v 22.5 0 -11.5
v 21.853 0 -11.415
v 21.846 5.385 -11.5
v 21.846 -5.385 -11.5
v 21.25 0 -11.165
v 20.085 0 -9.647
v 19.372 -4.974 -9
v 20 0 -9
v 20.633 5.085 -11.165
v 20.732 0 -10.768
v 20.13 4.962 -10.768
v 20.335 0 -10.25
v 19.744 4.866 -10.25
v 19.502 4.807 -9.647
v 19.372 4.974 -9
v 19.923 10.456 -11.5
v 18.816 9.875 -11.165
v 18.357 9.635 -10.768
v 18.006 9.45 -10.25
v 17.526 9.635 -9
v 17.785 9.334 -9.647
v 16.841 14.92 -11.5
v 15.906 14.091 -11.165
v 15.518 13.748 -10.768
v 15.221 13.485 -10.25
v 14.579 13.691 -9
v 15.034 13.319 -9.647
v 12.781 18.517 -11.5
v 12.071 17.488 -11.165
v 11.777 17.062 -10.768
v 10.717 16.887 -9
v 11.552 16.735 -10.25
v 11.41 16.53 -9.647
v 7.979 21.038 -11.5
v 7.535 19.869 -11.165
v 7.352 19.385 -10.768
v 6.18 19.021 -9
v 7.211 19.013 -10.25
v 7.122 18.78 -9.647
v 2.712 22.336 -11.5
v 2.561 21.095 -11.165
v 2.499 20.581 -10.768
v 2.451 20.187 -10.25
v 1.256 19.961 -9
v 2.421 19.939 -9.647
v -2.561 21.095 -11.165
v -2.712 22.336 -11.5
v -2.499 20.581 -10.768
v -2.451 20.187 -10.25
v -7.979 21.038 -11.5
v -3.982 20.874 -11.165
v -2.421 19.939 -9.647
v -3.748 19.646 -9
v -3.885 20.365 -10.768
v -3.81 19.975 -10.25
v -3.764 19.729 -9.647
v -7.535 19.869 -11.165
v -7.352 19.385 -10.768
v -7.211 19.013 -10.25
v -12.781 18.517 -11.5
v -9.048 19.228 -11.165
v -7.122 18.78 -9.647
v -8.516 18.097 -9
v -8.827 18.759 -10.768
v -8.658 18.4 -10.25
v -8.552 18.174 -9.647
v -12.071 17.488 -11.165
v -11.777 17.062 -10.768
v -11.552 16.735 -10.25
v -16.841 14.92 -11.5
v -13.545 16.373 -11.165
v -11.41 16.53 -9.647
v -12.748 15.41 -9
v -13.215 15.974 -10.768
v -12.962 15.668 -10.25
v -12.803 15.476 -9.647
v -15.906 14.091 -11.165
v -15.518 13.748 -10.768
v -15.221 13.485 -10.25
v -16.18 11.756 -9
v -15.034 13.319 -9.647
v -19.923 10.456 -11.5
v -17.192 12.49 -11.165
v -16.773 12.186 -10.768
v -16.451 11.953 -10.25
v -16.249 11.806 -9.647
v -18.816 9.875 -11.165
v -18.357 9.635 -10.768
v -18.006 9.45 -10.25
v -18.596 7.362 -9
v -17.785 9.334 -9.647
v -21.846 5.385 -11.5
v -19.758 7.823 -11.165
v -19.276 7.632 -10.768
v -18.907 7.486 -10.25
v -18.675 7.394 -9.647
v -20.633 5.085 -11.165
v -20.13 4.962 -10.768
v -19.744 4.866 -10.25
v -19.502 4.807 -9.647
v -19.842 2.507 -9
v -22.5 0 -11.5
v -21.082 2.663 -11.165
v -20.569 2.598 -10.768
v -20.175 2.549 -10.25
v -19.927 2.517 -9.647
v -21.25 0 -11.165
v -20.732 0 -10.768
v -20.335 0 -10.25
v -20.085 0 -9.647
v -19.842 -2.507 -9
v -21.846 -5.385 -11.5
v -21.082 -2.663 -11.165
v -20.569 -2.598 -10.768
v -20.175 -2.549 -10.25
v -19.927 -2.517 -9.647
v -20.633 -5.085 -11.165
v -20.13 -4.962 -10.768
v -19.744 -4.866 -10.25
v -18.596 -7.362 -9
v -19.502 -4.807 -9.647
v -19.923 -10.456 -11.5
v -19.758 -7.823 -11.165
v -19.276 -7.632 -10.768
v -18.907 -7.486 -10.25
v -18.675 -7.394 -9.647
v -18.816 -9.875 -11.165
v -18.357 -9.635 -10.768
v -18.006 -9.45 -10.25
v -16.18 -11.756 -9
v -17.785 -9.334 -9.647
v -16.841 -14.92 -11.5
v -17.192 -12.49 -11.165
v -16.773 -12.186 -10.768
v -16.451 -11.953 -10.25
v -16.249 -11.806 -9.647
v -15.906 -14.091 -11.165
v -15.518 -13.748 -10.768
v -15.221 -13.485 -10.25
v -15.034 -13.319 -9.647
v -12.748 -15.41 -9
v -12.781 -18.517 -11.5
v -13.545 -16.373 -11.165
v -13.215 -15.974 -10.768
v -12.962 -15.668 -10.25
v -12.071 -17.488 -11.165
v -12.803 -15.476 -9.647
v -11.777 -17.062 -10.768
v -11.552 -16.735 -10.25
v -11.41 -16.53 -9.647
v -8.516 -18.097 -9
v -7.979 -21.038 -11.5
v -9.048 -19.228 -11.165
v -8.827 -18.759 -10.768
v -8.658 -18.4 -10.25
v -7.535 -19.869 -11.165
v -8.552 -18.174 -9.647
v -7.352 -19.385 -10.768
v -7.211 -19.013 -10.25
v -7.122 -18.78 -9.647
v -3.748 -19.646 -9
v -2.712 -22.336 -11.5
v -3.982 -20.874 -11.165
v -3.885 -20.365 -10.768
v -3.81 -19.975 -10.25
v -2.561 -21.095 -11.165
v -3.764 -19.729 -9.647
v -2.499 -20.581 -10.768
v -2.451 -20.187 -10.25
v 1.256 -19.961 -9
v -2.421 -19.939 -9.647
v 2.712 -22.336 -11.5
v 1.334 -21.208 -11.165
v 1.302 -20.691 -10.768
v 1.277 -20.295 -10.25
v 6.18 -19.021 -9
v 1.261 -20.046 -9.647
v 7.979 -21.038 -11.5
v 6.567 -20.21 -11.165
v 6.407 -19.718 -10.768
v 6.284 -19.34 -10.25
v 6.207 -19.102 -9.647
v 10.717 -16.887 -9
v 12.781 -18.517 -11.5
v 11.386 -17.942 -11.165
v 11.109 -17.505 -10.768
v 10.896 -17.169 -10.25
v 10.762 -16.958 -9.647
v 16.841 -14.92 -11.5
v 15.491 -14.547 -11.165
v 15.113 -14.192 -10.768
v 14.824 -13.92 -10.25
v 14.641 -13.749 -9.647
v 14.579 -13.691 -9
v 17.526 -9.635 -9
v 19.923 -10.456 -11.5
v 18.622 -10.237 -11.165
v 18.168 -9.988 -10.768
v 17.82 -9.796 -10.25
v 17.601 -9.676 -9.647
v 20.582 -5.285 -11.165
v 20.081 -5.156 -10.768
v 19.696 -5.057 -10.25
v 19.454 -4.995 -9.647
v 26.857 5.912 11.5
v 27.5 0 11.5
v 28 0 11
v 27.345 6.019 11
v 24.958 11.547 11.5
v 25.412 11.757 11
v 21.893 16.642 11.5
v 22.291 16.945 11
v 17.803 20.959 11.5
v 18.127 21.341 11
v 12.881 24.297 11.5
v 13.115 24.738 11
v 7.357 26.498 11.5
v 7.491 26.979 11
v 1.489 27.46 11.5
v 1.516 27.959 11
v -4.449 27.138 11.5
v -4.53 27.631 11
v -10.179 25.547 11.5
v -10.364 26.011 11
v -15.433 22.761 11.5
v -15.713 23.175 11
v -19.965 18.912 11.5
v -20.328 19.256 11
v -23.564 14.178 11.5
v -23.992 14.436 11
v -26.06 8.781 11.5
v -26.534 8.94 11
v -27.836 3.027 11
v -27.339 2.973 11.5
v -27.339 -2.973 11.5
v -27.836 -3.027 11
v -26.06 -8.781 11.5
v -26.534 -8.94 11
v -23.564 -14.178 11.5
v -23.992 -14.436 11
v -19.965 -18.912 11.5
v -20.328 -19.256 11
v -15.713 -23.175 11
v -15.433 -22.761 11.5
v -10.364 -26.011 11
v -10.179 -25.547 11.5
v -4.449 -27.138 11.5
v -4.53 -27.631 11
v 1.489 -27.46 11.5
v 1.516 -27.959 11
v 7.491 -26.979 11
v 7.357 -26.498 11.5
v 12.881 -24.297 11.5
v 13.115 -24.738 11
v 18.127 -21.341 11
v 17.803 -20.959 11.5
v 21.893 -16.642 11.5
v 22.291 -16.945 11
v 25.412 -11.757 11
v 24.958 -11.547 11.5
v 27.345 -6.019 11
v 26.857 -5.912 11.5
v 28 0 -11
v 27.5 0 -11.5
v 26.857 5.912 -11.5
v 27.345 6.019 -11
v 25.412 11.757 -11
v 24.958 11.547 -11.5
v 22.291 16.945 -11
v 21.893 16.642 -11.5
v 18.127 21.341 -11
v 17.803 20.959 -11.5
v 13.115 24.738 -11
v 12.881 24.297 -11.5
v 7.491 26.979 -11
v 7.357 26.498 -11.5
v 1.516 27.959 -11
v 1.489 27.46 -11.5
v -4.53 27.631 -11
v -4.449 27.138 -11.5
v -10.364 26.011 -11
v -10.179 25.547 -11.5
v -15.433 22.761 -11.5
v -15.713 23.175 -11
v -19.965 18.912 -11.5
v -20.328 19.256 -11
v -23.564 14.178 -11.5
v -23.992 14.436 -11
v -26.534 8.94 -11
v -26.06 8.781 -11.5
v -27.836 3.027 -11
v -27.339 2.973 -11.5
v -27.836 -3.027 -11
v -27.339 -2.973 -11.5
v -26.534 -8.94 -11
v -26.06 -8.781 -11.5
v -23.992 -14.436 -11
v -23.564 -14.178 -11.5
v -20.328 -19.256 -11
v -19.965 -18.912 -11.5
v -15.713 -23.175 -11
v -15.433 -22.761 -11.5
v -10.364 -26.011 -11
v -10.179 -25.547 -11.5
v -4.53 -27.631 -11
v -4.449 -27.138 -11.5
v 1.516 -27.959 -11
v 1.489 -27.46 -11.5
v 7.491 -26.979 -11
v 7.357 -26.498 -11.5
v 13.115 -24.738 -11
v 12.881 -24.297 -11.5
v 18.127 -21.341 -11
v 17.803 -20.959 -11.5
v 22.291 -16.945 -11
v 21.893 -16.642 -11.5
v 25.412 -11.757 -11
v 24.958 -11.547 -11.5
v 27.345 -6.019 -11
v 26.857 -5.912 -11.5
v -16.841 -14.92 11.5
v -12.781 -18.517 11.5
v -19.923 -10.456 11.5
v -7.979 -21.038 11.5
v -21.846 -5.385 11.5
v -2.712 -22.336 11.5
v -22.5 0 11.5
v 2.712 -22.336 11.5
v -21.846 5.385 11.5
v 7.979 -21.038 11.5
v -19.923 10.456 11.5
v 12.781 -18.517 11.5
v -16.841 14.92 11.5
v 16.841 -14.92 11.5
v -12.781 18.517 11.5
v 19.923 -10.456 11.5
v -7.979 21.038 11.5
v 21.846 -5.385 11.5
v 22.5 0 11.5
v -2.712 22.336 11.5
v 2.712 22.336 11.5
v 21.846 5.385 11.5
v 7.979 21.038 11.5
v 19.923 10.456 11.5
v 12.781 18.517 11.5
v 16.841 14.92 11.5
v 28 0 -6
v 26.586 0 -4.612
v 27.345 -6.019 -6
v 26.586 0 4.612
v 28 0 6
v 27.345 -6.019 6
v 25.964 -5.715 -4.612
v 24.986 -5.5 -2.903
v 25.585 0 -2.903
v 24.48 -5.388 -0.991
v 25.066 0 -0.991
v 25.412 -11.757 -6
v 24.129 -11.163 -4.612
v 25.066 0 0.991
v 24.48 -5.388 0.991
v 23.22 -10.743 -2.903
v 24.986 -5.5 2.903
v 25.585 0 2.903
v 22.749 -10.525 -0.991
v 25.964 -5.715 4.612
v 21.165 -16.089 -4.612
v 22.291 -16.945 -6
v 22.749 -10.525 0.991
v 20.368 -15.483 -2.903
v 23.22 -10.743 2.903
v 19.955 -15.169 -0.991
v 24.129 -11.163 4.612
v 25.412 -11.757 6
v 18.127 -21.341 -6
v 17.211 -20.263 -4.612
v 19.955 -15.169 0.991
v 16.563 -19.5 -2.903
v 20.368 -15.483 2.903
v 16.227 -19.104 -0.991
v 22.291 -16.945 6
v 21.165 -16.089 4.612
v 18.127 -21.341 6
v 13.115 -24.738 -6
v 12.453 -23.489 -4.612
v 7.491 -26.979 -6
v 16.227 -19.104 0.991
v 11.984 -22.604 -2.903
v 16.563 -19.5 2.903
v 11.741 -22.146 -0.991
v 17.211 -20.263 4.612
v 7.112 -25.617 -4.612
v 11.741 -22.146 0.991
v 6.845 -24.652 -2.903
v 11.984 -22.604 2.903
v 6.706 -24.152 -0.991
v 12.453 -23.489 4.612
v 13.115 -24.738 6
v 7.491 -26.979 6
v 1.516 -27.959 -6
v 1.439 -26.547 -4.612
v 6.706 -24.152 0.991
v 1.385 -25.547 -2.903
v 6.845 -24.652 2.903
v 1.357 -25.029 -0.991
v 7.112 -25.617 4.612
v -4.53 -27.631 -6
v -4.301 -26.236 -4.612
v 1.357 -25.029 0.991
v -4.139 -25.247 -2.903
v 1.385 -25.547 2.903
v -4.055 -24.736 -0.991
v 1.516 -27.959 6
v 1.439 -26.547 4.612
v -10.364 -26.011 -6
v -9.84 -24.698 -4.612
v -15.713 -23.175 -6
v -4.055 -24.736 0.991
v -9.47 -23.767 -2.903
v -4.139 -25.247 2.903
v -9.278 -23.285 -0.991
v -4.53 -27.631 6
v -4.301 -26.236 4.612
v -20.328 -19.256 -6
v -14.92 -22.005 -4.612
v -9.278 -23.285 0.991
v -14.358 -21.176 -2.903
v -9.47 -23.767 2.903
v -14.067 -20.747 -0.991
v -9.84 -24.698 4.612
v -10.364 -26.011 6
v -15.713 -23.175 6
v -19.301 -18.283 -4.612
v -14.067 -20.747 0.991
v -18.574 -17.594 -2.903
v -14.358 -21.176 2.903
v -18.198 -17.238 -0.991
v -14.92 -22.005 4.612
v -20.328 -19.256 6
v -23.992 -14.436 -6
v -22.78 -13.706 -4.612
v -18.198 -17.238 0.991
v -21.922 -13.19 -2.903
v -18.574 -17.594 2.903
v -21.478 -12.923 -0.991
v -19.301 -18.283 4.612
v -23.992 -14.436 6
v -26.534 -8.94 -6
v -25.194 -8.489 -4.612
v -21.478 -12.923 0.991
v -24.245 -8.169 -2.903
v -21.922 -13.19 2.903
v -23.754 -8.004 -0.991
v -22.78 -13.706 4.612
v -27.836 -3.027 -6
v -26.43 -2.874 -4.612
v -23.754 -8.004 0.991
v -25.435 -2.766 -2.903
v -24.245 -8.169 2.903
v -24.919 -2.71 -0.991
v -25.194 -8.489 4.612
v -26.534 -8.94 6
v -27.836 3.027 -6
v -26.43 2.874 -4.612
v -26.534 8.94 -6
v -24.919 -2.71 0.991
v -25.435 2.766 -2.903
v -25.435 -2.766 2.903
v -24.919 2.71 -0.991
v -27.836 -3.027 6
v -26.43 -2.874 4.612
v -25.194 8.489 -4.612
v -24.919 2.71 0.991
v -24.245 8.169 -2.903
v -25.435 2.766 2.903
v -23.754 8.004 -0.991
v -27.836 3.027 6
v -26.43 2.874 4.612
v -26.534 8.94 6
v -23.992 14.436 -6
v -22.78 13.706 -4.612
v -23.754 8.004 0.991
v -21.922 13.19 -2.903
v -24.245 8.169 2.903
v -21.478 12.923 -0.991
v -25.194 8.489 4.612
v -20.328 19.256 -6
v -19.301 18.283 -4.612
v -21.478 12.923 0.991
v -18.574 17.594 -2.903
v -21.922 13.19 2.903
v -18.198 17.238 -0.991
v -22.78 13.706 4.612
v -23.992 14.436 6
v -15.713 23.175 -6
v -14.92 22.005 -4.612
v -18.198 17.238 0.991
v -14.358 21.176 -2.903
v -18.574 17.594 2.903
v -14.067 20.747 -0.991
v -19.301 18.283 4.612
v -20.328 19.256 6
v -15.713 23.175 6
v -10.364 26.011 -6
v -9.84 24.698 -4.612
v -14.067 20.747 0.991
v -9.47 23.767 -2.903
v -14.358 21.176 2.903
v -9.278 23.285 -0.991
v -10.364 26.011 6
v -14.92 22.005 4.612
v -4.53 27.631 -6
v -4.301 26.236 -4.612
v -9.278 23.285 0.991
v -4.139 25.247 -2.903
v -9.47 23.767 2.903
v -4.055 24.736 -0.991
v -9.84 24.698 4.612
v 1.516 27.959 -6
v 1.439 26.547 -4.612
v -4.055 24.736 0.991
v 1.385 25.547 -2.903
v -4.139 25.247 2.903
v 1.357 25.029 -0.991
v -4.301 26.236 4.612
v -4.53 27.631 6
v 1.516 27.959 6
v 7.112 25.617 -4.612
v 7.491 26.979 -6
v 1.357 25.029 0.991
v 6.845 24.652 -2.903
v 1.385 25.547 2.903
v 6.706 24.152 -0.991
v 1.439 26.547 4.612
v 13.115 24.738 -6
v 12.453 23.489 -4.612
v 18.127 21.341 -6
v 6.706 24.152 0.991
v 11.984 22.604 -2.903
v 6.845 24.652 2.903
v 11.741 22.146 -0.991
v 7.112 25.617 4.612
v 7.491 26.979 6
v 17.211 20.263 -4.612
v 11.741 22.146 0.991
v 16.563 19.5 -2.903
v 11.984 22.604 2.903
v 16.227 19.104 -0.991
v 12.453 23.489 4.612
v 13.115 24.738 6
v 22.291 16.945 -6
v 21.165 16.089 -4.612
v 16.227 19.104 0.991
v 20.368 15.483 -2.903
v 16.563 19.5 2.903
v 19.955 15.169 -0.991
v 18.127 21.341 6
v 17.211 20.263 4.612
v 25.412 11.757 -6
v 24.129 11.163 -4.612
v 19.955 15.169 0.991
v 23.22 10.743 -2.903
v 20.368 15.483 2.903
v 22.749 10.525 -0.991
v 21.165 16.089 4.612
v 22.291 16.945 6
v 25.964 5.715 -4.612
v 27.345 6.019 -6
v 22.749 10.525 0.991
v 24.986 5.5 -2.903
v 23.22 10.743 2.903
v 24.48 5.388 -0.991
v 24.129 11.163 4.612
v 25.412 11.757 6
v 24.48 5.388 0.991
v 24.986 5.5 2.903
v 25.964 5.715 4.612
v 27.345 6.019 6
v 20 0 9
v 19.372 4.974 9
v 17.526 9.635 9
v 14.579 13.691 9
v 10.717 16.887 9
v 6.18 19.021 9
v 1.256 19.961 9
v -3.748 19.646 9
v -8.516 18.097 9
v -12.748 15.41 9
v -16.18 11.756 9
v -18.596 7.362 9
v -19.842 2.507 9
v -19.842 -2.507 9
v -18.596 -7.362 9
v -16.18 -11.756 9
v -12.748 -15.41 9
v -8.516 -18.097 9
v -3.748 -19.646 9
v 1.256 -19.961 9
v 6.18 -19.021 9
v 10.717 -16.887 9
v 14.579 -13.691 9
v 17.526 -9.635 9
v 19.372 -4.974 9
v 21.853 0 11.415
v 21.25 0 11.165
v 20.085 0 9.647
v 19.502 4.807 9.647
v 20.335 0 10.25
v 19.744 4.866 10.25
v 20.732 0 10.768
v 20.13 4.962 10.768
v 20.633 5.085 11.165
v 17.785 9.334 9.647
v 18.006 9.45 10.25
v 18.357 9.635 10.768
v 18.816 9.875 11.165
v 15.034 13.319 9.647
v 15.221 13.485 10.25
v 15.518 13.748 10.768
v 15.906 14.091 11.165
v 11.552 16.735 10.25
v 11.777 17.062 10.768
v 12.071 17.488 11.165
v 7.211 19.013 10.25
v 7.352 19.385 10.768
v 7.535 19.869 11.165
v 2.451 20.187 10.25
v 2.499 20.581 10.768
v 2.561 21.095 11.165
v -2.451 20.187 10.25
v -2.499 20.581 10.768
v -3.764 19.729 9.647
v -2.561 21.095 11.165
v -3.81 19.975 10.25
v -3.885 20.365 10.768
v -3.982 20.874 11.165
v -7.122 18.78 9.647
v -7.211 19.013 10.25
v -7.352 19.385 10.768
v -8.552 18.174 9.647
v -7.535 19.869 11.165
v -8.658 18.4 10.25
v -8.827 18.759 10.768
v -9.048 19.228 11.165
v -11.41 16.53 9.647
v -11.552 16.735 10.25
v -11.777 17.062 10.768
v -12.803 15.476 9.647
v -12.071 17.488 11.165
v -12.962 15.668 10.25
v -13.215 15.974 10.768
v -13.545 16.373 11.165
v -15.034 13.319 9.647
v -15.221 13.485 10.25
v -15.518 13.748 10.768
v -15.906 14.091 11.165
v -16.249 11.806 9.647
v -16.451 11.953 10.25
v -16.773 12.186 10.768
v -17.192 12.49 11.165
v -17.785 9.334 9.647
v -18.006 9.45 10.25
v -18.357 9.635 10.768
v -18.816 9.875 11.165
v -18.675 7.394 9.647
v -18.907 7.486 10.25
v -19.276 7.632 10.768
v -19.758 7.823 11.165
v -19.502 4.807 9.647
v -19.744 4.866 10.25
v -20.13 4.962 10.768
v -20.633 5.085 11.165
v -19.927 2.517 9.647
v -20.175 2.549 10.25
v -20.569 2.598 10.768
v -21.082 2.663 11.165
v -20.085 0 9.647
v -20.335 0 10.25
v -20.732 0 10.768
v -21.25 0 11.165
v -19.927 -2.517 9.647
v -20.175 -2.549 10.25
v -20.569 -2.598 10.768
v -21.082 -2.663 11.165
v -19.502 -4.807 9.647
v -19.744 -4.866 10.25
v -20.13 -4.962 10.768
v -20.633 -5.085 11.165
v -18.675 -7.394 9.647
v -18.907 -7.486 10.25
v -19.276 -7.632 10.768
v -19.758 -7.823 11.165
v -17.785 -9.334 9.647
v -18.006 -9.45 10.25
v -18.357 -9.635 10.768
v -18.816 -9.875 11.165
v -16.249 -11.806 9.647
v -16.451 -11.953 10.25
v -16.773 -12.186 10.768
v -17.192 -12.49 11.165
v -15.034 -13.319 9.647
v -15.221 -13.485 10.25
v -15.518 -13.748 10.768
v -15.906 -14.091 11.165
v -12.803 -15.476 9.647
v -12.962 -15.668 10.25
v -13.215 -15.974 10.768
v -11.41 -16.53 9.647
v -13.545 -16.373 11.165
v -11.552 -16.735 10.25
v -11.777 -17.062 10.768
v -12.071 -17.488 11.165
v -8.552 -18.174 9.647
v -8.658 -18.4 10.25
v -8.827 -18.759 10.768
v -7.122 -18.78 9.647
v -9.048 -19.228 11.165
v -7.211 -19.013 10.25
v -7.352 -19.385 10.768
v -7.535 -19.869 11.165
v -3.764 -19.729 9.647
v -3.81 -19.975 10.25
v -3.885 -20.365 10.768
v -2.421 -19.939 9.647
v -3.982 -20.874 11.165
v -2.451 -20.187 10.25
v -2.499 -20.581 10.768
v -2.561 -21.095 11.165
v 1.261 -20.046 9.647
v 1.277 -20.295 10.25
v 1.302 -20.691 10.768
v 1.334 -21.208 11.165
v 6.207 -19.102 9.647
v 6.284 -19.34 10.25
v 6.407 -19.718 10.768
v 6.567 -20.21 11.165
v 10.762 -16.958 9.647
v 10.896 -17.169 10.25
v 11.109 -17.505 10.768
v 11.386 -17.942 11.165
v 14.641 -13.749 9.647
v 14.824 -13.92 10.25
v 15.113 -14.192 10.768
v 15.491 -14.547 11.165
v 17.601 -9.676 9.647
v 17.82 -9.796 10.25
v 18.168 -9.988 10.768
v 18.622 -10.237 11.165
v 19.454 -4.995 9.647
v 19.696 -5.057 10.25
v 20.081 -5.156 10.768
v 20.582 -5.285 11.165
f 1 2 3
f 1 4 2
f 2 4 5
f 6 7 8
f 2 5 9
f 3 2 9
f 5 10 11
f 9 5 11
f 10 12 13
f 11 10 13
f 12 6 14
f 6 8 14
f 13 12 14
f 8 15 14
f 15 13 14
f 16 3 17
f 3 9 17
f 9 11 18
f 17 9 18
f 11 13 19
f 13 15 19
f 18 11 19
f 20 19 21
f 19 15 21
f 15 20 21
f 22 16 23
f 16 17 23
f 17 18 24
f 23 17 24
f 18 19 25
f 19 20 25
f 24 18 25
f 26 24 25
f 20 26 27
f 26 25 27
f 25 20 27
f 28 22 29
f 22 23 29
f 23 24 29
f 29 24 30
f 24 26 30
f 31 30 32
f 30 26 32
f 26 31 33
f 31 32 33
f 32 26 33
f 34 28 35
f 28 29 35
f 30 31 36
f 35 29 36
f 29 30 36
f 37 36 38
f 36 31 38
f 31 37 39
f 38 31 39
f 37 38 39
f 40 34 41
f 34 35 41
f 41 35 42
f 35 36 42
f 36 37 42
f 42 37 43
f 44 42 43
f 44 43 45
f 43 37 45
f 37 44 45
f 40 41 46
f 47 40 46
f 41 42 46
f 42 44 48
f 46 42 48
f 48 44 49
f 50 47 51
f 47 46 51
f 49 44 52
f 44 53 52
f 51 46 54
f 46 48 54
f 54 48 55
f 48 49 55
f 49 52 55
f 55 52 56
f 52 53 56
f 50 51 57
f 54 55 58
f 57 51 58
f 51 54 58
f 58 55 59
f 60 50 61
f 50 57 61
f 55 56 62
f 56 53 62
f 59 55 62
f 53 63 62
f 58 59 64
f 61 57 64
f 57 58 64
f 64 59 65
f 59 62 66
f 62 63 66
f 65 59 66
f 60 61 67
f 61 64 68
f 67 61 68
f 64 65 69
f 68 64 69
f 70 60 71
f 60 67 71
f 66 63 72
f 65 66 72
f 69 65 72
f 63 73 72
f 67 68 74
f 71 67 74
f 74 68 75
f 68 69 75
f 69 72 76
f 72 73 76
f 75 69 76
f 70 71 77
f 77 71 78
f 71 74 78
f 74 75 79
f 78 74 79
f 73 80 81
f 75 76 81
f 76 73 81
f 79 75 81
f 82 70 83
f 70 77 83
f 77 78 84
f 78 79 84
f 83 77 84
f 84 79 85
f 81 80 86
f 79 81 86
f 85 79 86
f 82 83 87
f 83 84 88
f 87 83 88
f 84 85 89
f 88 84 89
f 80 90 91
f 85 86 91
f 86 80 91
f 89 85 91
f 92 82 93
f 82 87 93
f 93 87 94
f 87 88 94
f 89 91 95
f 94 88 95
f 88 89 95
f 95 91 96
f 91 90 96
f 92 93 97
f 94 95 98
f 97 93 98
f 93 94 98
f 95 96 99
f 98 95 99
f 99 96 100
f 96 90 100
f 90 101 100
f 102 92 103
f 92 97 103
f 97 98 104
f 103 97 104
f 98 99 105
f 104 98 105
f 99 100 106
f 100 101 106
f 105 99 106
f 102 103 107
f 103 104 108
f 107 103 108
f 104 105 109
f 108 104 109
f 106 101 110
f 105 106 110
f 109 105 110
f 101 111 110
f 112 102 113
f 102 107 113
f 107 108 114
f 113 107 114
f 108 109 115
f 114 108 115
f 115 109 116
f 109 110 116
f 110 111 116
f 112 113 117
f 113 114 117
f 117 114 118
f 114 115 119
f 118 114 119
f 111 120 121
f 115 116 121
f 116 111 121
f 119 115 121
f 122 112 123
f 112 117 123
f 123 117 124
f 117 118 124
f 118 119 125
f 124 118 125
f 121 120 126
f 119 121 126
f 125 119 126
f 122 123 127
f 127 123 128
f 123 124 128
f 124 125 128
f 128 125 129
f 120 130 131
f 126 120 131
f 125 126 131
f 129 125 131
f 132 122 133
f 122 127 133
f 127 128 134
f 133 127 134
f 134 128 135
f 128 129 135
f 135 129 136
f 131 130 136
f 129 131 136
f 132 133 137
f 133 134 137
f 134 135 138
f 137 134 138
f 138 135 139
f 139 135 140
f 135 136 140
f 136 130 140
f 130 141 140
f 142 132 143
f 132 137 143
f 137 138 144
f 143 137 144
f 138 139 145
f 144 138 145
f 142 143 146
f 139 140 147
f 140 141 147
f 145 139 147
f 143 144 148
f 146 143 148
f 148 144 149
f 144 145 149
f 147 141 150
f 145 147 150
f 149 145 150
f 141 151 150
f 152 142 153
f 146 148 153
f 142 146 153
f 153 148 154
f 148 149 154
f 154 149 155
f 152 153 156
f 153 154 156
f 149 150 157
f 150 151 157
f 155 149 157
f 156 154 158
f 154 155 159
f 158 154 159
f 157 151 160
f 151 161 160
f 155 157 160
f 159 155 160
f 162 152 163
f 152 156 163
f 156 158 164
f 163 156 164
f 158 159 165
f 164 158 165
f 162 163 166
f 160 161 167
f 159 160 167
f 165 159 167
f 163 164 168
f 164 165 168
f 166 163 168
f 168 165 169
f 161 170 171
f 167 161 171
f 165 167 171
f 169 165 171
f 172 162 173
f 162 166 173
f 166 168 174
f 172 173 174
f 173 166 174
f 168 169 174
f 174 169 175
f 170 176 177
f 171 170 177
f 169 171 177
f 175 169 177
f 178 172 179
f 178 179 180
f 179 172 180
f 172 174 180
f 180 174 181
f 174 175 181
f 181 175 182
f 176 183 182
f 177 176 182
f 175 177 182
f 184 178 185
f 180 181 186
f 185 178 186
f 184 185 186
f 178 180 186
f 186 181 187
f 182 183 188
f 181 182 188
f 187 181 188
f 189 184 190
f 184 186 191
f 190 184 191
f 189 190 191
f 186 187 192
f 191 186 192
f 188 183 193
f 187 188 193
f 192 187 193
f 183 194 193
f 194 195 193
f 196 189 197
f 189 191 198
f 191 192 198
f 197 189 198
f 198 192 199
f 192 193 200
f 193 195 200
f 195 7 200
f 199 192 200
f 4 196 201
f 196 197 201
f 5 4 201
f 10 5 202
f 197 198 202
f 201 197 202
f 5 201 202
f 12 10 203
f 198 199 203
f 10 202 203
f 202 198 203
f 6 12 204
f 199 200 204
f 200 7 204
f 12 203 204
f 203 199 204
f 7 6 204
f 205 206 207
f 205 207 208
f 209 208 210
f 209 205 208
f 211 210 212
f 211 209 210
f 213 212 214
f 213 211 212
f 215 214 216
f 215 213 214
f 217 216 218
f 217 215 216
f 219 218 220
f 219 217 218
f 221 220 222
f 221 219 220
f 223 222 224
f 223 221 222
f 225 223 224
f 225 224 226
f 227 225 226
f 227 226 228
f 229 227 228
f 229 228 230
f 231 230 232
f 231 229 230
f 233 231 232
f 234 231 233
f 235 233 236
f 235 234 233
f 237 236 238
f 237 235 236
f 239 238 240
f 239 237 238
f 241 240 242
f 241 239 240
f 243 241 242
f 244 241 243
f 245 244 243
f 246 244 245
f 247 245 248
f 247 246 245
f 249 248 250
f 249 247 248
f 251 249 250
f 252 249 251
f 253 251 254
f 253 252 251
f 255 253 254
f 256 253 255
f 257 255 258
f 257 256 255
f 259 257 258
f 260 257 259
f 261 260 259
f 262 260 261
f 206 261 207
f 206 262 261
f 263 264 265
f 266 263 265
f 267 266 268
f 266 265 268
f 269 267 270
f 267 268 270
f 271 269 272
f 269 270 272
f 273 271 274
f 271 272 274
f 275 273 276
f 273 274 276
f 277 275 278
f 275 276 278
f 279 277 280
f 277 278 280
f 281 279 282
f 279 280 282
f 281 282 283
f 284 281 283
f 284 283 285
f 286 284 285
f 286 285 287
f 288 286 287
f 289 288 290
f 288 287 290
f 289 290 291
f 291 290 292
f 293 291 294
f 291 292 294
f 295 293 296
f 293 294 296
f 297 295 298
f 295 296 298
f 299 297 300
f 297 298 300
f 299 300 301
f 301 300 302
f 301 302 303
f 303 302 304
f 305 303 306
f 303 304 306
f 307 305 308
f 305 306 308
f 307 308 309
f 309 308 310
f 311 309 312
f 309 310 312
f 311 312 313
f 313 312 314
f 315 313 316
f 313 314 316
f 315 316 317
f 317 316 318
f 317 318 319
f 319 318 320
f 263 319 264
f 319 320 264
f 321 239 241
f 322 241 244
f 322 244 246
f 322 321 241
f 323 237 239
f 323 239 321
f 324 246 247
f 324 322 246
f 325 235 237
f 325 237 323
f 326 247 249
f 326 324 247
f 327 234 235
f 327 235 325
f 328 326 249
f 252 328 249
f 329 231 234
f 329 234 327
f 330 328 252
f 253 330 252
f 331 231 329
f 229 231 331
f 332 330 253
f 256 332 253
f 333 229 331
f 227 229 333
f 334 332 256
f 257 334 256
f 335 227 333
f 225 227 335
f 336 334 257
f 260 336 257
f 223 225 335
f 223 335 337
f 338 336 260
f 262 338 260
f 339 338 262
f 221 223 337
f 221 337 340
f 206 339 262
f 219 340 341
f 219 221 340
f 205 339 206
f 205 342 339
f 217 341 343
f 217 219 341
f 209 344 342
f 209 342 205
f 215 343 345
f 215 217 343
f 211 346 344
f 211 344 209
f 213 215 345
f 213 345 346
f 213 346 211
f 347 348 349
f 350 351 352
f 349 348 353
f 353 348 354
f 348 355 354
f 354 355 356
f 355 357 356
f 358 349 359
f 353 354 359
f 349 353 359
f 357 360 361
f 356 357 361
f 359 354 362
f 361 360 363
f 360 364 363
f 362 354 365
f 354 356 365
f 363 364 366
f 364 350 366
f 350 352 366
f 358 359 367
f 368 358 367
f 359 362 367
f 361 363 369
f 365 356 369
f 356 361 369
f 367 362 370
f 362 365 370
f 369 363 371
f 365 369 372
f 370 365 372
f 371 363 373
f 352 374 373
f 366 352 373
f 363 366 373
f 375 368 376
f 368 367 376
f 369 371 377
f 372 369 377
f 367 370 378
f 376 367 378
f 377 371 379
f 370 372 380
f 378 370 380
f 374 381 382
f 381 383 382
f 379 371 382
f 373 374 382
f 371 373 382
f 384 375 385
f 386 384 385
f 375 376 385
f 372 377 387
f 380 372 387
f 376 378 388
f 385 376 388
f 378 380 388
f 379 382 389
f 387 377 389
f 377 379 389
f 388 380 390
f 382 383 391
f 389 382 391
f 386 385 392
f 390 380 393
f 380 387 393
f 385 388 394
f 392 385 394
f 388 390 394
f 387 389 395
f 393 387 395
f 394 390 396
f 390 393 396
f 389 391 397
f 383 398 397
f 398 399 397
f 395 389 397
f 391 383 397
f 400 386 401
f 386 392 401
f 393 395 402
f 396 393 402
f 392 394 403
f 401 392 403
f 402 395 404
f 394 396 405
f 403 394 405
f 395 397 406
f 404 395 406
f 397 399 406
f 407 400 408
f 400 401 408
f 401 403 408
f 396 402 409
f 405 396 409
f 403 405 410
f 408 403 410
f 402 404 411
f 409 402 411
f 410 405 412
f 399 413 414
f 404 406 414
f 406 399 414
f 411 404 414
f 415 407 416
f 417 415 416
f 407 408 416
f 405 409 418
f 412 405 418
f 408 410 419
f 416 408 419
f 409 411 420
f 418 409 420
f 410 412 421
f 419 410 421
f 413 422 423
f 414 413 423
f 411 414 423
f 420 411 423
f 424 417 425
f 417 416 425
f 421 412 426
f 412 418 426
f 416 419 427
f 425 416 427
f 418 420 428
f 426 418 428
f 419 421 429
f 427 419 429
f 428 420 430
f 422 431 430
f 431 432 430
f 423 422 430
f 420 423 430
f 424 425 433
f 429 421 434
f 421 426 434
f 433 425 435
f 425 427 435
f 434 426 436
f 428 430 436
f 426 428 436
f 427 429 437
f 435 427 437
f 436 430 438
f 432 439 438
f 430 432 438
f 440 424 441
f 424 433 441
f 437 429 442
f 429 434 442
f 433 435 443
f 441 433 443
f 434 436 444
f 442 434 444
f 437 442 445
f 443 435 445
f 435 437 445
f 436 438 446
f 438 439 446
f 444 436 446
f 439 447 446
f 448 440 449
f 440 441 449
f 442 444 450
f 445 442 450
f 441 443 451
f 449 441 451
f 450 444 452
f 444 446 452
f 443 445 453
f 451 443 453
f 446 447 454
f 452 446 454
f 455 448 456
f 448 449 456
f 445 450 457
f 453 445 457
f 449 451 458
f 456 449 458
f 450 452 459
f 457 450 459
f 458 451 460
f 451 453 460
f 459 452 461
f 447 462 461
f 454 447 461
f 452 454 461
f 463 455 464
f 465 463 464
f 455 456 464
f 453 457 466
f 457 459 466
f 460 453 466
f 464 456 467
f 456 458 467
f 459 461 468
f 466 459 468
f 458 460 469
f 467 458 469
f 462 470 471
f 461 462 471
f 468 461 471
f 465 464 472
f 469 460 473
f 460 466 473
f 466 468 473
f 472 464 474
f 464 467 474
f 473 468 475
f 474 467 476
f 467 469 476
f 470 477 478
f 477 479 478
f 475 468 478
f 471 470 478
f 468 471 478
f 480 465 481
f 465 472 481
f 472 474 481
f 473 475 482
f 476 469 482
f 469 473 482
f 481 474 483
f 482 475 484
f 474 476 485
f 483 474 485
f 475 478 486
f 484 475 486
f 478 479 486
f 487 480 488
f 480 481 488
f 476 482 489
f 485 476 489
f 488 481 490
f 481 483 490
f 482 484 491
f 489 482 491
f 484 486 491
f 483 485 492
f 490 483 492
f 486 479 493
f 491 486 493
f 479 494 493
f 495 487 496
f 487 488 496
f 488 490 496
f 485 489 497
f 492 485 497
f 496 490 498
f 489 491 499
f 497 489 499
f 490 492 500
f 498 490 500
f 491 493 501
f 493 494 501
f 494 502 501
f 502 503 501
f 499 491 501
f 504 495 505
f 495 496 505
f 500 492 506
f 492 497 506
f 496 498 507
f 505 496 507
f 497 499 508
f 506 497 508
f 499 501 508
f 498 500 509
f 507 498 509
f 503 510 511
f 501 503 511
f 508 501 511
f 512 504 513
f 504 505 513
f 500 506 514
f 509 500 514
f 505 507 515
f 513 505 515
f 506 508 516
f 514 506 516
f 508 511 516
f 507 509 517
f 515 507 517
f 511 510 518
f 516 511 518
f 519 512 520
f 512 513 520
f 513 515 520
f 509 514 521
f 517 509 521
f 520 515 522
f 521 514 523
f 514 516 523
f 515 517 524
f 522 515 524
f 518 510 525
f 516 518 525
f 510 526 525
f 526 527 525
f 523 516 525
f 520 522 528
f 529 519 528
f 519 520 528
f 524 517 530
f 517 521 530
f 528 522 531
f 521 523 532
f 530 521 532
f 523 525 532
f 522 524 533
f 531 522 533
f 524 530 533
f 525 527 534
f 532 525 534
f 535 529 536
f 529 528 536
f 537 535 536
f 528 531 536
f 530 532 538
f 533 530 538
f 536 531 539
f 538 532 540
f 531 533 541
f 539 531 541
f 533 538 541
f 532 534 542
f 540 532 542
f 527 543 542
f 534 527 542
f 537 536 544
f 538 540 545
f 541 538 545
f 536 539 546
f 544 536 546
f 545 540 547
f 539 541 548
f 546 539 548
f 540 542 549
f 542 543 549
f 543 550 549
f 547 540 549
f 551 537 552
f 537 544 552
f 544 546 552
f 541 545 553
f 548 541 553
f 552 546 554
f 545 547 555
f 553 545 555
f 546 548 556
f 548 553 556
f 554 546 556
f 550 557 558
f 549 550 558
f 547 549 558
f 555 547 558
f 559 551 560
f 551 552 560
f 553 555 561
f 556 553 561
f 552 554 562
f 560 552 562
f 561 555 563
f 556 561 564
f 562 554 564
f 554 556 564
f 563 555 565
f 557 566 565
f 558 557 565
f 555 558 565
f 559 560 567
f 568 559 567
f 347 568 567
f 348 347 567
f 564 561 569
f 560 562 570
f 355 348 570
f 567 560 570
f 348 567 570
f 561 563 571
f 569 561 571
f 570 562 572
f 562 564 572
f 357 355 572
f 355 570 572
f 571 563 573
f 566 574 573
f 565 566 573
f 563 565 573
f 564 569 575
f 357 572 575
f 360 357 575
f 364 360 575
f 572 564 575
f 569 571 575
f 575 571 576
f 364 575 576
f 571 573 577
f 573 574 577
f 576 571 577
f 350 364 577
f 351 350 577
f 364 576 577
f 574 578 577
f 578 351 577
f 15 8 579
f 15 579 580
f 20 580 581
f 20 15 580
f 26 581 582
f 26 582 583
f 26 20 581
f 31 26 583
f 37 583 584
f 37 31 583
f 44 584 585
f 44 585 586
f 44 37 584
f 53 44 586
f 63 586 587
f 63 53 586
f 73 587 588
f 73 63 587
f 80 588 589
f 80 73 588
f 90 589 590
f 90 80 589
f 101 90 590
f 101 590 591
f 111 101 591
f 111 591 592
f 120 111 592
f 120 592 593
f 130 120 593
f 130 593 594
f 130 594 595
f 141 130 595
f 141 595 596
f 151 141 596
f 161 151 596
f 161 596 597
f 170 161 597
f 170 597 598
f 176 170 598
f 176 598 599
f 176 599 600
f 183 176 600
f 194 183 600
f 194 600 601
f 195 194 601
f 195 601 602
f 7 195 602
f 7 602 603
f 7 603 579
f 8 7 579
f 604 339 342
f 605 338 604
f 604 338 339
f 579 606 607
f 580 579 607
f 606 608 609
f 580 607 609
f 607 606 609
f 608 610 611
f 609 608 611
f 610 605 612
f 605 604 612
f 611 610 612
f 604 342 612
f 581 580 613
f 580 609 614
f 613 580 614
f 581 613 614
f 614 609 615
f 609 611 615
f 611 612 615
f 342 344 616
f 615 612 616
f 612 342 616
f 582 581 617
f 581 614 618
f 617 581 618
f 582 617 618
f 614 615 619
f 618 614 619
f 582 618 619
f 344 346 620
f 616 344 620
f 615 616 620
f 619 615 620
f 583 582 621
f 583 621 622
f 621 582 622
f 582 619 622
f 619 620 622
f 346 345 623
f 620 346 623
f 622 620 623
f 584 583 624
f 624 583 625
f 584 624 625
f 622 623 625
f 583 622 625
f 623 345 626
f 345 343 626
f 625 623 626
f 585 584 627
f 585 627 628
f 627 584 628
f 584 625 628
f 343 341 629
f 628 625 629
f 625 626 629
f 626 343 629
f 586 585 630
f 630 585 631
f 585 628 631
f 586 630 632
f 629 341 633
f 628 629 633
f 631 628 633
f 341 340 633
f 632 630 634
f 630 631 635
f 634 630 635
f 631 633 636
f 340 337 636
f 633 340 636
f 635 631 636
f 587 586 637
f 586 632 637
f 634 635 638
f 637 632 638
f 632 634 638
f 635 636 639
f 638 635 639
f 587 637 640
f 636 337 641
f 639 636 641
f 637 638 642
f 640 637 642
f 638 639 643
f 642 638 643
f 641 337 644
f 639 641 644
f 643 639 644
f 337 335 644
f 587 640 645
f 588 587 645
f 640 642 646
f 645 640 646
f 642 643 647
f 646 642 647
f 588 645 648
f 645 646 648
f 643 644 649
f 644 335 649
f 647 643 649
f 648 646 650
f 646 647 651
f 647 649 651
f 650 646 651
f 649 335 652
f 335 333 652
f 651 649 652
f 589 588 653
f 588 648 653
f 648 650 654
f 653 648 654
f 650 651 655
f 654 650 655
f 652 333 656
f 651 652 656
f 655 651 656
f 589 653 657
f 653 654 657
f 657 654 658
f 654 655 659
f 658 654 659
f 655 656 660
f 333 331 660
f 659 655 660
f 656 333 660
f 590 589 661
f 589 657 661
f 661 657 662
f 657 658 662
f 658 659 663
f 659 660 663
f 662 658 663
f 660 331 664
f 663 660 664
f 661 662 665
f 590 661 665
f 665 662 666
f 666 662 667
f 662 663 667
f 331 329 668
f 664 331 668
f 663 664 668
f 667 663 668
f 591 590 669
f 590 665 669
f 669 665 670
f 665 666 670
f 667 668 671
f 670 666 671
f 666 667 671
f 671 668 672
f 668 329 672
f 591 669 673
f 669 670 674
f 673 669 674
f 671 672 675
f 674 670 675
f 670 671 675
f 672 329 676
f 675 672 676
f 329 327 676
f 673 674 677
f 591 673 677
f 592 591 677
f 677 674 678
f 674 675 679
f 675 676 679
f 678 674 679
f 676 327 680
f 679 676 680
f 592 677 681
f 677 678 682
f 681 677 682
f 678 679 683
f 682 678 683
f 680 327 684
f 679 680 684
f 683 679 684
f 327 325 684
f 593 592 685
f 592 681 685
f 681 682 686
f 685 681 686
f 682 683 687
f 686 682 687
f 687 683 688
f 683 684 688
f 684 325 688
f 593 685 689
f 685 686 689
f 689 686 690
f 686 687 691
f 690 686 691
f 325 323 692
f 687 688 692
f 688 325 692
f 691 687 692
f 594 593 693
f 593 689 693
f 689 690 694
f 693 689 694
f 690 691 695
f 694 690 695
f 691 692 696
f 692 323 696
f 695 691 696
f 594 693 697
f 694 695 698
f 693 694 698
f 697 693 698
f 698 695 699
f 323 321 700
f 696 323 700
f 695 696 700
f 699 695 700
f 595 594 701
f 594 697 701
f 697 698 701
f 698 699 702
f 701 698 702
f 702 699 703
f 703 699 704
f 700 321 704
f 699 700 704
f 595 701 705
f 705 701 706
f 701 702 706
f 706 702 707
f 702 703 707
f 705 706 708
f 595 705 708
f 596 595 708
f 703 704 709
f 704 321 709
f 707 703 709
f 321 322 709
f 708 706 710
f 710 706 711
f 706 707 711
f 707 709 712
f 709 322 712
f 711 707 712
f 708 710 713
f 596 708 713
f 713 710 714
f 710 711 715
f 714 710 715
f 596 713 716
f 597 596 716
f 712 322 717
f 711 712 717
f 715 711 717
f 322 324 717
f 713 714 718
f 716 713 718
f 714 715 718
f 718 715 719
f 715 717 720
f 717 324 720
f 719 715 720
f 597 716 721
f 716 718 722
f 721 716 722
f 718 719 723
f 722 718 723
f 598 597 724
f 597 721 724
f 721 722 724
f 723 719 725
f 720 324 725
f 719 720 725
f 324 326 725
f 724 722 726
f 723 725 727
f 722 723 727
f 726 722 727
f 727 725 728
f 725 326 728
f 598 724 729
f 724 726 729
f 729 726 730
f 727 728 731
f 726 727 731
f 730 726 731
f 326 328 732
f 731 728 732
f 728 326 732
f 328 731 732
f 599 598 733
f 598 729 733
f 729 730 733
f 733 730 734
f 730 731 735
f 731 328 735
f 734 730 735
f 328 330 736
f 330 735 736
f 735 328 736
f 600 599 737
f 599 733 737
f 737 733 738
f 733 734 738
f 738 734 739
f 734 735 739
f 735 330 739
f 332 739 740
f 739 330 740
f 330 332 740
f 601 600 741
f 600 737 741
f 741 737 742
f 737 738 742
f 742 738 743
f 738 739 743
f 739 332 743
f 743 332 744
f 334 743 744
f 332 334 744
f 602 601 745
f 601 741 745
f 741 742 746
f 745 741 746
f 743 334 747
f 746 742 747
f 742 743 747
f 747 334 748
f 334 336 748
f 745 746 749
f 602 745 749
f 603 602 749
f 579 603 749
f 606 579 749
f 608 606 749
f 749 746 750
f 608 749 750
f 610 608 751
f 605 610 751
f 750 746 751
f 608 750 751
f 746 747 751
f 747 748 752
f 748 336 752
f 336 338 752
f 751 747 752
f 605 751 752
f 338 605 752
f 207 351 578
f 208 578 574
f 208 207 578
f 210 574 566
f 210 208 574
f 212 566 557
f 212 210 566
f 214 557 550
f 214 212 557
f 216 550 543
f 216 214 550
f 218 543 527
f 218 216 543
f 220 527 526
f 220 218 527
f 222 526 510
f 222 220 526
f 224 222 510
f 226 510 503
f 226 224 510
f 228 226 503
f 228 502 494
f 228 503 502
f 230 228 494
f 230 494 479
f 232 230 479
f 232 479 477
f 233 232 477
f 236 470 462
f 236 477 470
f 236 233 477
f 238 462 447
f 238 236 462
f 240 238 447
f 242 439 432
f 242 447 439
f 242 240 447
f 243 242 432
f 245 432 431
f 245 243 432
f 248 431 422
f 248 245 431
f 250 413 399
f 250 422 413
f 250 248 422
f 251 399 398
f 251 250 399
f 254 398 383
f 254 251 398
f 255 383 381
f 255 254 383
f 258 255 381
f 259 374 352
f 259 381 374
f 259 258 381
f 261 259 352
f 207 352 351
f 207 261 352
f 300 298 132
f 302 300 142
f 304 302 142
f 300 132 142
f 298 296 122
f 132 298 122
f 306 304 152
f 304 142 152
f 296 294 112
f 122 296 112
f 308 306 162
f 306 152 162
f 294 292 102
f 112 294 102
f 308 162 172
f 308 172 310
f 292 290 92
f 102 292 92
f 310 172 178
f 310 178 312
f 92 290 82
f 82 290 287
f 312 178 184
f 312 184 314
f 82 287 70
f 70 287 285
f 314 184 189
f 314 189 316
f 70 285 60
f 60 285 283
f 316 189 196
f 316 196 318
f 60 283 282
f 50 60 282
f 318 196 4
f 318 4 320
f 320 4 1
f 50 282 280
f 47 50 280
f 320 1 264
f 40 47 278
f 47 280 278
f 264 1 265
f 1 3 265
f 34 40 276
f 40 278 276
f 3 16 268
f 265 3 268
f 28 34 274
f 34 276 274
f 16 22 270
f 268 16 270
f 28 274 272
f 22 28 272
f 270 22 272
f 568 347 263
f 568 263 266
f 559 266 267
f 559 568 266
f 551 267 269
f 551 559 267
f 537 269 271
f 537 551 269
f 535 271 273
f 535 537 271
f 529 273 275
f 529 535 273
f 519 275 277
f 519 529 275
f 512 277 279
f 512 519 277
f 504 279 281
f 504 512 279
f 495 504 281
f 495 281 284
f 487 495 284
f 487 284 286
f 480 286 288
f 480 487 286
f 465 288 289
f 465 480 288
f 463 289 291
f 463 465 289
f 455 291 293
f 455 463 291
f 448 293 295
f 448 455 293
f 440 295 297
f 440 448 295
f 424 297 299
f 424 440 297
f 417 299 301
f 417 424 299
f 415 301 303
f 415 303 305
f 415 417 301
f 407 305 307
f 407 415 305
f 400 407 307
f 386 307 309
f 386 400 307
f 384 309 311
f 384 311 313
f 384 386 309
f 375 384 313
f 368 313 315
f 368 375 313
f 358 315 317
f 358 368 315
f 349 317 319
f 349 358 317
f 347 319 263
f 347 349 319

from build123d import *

# Parameters (mm, degrees)
SKETCH1_R           = 28
SKETCH1_R_2         = 20
BOSS_EXTRUDE1_DEPTH = 11.5
SKETCH3_R           = 7.5
CHAMFER1_SIZE       = 0.5
FILLET1_R           = 2.5


with BuildPart() as part:
    # Sketch1 → Boss-Extrude1 (new, symmetric)
    with BuildSketch(Plane.XY):
        Circle(SKETCH1_R)
        Circle(SKETCH1_R_2, mode=Mode.SUBTRACT)
    extrude(amount=BOSS_EXTRUDE1_DEPTH, both=True)

    # Sketch3 → Cut-Revolve1 (revolve, cut)
    with BuildSketch(Plane(origin=(0, 0, 0), x_dir=(1, 0, 0), z_dir=(0, 1, 0))):
        with Locations((32.5, 0)):
            Circle(SKETCH3_R)
    revolve(axis=Axis((0, 0, 0), (0, 0, -1)), mode=Mode.SUBTRACT)

    # Chamfer1
    chamfer1_edges = [part.edges().sort_by_distance(p)[0] for p in [
        (-28, 0, -11.5),
        (-28, 0, 11.5),
    ]]
    chamfer(chamfer1_edges, length=CHAMFER1_SIZE)

    # Fillet1
    fillet1_edges = [part.edges().sort_by_distance(p)[0] for p in [
        (-20, 0, -11.5),
        (-20, 0, 11.5),
    ]]
    fillet(fillet1_edges, radius=FILLET1_R)


solid = part.part
